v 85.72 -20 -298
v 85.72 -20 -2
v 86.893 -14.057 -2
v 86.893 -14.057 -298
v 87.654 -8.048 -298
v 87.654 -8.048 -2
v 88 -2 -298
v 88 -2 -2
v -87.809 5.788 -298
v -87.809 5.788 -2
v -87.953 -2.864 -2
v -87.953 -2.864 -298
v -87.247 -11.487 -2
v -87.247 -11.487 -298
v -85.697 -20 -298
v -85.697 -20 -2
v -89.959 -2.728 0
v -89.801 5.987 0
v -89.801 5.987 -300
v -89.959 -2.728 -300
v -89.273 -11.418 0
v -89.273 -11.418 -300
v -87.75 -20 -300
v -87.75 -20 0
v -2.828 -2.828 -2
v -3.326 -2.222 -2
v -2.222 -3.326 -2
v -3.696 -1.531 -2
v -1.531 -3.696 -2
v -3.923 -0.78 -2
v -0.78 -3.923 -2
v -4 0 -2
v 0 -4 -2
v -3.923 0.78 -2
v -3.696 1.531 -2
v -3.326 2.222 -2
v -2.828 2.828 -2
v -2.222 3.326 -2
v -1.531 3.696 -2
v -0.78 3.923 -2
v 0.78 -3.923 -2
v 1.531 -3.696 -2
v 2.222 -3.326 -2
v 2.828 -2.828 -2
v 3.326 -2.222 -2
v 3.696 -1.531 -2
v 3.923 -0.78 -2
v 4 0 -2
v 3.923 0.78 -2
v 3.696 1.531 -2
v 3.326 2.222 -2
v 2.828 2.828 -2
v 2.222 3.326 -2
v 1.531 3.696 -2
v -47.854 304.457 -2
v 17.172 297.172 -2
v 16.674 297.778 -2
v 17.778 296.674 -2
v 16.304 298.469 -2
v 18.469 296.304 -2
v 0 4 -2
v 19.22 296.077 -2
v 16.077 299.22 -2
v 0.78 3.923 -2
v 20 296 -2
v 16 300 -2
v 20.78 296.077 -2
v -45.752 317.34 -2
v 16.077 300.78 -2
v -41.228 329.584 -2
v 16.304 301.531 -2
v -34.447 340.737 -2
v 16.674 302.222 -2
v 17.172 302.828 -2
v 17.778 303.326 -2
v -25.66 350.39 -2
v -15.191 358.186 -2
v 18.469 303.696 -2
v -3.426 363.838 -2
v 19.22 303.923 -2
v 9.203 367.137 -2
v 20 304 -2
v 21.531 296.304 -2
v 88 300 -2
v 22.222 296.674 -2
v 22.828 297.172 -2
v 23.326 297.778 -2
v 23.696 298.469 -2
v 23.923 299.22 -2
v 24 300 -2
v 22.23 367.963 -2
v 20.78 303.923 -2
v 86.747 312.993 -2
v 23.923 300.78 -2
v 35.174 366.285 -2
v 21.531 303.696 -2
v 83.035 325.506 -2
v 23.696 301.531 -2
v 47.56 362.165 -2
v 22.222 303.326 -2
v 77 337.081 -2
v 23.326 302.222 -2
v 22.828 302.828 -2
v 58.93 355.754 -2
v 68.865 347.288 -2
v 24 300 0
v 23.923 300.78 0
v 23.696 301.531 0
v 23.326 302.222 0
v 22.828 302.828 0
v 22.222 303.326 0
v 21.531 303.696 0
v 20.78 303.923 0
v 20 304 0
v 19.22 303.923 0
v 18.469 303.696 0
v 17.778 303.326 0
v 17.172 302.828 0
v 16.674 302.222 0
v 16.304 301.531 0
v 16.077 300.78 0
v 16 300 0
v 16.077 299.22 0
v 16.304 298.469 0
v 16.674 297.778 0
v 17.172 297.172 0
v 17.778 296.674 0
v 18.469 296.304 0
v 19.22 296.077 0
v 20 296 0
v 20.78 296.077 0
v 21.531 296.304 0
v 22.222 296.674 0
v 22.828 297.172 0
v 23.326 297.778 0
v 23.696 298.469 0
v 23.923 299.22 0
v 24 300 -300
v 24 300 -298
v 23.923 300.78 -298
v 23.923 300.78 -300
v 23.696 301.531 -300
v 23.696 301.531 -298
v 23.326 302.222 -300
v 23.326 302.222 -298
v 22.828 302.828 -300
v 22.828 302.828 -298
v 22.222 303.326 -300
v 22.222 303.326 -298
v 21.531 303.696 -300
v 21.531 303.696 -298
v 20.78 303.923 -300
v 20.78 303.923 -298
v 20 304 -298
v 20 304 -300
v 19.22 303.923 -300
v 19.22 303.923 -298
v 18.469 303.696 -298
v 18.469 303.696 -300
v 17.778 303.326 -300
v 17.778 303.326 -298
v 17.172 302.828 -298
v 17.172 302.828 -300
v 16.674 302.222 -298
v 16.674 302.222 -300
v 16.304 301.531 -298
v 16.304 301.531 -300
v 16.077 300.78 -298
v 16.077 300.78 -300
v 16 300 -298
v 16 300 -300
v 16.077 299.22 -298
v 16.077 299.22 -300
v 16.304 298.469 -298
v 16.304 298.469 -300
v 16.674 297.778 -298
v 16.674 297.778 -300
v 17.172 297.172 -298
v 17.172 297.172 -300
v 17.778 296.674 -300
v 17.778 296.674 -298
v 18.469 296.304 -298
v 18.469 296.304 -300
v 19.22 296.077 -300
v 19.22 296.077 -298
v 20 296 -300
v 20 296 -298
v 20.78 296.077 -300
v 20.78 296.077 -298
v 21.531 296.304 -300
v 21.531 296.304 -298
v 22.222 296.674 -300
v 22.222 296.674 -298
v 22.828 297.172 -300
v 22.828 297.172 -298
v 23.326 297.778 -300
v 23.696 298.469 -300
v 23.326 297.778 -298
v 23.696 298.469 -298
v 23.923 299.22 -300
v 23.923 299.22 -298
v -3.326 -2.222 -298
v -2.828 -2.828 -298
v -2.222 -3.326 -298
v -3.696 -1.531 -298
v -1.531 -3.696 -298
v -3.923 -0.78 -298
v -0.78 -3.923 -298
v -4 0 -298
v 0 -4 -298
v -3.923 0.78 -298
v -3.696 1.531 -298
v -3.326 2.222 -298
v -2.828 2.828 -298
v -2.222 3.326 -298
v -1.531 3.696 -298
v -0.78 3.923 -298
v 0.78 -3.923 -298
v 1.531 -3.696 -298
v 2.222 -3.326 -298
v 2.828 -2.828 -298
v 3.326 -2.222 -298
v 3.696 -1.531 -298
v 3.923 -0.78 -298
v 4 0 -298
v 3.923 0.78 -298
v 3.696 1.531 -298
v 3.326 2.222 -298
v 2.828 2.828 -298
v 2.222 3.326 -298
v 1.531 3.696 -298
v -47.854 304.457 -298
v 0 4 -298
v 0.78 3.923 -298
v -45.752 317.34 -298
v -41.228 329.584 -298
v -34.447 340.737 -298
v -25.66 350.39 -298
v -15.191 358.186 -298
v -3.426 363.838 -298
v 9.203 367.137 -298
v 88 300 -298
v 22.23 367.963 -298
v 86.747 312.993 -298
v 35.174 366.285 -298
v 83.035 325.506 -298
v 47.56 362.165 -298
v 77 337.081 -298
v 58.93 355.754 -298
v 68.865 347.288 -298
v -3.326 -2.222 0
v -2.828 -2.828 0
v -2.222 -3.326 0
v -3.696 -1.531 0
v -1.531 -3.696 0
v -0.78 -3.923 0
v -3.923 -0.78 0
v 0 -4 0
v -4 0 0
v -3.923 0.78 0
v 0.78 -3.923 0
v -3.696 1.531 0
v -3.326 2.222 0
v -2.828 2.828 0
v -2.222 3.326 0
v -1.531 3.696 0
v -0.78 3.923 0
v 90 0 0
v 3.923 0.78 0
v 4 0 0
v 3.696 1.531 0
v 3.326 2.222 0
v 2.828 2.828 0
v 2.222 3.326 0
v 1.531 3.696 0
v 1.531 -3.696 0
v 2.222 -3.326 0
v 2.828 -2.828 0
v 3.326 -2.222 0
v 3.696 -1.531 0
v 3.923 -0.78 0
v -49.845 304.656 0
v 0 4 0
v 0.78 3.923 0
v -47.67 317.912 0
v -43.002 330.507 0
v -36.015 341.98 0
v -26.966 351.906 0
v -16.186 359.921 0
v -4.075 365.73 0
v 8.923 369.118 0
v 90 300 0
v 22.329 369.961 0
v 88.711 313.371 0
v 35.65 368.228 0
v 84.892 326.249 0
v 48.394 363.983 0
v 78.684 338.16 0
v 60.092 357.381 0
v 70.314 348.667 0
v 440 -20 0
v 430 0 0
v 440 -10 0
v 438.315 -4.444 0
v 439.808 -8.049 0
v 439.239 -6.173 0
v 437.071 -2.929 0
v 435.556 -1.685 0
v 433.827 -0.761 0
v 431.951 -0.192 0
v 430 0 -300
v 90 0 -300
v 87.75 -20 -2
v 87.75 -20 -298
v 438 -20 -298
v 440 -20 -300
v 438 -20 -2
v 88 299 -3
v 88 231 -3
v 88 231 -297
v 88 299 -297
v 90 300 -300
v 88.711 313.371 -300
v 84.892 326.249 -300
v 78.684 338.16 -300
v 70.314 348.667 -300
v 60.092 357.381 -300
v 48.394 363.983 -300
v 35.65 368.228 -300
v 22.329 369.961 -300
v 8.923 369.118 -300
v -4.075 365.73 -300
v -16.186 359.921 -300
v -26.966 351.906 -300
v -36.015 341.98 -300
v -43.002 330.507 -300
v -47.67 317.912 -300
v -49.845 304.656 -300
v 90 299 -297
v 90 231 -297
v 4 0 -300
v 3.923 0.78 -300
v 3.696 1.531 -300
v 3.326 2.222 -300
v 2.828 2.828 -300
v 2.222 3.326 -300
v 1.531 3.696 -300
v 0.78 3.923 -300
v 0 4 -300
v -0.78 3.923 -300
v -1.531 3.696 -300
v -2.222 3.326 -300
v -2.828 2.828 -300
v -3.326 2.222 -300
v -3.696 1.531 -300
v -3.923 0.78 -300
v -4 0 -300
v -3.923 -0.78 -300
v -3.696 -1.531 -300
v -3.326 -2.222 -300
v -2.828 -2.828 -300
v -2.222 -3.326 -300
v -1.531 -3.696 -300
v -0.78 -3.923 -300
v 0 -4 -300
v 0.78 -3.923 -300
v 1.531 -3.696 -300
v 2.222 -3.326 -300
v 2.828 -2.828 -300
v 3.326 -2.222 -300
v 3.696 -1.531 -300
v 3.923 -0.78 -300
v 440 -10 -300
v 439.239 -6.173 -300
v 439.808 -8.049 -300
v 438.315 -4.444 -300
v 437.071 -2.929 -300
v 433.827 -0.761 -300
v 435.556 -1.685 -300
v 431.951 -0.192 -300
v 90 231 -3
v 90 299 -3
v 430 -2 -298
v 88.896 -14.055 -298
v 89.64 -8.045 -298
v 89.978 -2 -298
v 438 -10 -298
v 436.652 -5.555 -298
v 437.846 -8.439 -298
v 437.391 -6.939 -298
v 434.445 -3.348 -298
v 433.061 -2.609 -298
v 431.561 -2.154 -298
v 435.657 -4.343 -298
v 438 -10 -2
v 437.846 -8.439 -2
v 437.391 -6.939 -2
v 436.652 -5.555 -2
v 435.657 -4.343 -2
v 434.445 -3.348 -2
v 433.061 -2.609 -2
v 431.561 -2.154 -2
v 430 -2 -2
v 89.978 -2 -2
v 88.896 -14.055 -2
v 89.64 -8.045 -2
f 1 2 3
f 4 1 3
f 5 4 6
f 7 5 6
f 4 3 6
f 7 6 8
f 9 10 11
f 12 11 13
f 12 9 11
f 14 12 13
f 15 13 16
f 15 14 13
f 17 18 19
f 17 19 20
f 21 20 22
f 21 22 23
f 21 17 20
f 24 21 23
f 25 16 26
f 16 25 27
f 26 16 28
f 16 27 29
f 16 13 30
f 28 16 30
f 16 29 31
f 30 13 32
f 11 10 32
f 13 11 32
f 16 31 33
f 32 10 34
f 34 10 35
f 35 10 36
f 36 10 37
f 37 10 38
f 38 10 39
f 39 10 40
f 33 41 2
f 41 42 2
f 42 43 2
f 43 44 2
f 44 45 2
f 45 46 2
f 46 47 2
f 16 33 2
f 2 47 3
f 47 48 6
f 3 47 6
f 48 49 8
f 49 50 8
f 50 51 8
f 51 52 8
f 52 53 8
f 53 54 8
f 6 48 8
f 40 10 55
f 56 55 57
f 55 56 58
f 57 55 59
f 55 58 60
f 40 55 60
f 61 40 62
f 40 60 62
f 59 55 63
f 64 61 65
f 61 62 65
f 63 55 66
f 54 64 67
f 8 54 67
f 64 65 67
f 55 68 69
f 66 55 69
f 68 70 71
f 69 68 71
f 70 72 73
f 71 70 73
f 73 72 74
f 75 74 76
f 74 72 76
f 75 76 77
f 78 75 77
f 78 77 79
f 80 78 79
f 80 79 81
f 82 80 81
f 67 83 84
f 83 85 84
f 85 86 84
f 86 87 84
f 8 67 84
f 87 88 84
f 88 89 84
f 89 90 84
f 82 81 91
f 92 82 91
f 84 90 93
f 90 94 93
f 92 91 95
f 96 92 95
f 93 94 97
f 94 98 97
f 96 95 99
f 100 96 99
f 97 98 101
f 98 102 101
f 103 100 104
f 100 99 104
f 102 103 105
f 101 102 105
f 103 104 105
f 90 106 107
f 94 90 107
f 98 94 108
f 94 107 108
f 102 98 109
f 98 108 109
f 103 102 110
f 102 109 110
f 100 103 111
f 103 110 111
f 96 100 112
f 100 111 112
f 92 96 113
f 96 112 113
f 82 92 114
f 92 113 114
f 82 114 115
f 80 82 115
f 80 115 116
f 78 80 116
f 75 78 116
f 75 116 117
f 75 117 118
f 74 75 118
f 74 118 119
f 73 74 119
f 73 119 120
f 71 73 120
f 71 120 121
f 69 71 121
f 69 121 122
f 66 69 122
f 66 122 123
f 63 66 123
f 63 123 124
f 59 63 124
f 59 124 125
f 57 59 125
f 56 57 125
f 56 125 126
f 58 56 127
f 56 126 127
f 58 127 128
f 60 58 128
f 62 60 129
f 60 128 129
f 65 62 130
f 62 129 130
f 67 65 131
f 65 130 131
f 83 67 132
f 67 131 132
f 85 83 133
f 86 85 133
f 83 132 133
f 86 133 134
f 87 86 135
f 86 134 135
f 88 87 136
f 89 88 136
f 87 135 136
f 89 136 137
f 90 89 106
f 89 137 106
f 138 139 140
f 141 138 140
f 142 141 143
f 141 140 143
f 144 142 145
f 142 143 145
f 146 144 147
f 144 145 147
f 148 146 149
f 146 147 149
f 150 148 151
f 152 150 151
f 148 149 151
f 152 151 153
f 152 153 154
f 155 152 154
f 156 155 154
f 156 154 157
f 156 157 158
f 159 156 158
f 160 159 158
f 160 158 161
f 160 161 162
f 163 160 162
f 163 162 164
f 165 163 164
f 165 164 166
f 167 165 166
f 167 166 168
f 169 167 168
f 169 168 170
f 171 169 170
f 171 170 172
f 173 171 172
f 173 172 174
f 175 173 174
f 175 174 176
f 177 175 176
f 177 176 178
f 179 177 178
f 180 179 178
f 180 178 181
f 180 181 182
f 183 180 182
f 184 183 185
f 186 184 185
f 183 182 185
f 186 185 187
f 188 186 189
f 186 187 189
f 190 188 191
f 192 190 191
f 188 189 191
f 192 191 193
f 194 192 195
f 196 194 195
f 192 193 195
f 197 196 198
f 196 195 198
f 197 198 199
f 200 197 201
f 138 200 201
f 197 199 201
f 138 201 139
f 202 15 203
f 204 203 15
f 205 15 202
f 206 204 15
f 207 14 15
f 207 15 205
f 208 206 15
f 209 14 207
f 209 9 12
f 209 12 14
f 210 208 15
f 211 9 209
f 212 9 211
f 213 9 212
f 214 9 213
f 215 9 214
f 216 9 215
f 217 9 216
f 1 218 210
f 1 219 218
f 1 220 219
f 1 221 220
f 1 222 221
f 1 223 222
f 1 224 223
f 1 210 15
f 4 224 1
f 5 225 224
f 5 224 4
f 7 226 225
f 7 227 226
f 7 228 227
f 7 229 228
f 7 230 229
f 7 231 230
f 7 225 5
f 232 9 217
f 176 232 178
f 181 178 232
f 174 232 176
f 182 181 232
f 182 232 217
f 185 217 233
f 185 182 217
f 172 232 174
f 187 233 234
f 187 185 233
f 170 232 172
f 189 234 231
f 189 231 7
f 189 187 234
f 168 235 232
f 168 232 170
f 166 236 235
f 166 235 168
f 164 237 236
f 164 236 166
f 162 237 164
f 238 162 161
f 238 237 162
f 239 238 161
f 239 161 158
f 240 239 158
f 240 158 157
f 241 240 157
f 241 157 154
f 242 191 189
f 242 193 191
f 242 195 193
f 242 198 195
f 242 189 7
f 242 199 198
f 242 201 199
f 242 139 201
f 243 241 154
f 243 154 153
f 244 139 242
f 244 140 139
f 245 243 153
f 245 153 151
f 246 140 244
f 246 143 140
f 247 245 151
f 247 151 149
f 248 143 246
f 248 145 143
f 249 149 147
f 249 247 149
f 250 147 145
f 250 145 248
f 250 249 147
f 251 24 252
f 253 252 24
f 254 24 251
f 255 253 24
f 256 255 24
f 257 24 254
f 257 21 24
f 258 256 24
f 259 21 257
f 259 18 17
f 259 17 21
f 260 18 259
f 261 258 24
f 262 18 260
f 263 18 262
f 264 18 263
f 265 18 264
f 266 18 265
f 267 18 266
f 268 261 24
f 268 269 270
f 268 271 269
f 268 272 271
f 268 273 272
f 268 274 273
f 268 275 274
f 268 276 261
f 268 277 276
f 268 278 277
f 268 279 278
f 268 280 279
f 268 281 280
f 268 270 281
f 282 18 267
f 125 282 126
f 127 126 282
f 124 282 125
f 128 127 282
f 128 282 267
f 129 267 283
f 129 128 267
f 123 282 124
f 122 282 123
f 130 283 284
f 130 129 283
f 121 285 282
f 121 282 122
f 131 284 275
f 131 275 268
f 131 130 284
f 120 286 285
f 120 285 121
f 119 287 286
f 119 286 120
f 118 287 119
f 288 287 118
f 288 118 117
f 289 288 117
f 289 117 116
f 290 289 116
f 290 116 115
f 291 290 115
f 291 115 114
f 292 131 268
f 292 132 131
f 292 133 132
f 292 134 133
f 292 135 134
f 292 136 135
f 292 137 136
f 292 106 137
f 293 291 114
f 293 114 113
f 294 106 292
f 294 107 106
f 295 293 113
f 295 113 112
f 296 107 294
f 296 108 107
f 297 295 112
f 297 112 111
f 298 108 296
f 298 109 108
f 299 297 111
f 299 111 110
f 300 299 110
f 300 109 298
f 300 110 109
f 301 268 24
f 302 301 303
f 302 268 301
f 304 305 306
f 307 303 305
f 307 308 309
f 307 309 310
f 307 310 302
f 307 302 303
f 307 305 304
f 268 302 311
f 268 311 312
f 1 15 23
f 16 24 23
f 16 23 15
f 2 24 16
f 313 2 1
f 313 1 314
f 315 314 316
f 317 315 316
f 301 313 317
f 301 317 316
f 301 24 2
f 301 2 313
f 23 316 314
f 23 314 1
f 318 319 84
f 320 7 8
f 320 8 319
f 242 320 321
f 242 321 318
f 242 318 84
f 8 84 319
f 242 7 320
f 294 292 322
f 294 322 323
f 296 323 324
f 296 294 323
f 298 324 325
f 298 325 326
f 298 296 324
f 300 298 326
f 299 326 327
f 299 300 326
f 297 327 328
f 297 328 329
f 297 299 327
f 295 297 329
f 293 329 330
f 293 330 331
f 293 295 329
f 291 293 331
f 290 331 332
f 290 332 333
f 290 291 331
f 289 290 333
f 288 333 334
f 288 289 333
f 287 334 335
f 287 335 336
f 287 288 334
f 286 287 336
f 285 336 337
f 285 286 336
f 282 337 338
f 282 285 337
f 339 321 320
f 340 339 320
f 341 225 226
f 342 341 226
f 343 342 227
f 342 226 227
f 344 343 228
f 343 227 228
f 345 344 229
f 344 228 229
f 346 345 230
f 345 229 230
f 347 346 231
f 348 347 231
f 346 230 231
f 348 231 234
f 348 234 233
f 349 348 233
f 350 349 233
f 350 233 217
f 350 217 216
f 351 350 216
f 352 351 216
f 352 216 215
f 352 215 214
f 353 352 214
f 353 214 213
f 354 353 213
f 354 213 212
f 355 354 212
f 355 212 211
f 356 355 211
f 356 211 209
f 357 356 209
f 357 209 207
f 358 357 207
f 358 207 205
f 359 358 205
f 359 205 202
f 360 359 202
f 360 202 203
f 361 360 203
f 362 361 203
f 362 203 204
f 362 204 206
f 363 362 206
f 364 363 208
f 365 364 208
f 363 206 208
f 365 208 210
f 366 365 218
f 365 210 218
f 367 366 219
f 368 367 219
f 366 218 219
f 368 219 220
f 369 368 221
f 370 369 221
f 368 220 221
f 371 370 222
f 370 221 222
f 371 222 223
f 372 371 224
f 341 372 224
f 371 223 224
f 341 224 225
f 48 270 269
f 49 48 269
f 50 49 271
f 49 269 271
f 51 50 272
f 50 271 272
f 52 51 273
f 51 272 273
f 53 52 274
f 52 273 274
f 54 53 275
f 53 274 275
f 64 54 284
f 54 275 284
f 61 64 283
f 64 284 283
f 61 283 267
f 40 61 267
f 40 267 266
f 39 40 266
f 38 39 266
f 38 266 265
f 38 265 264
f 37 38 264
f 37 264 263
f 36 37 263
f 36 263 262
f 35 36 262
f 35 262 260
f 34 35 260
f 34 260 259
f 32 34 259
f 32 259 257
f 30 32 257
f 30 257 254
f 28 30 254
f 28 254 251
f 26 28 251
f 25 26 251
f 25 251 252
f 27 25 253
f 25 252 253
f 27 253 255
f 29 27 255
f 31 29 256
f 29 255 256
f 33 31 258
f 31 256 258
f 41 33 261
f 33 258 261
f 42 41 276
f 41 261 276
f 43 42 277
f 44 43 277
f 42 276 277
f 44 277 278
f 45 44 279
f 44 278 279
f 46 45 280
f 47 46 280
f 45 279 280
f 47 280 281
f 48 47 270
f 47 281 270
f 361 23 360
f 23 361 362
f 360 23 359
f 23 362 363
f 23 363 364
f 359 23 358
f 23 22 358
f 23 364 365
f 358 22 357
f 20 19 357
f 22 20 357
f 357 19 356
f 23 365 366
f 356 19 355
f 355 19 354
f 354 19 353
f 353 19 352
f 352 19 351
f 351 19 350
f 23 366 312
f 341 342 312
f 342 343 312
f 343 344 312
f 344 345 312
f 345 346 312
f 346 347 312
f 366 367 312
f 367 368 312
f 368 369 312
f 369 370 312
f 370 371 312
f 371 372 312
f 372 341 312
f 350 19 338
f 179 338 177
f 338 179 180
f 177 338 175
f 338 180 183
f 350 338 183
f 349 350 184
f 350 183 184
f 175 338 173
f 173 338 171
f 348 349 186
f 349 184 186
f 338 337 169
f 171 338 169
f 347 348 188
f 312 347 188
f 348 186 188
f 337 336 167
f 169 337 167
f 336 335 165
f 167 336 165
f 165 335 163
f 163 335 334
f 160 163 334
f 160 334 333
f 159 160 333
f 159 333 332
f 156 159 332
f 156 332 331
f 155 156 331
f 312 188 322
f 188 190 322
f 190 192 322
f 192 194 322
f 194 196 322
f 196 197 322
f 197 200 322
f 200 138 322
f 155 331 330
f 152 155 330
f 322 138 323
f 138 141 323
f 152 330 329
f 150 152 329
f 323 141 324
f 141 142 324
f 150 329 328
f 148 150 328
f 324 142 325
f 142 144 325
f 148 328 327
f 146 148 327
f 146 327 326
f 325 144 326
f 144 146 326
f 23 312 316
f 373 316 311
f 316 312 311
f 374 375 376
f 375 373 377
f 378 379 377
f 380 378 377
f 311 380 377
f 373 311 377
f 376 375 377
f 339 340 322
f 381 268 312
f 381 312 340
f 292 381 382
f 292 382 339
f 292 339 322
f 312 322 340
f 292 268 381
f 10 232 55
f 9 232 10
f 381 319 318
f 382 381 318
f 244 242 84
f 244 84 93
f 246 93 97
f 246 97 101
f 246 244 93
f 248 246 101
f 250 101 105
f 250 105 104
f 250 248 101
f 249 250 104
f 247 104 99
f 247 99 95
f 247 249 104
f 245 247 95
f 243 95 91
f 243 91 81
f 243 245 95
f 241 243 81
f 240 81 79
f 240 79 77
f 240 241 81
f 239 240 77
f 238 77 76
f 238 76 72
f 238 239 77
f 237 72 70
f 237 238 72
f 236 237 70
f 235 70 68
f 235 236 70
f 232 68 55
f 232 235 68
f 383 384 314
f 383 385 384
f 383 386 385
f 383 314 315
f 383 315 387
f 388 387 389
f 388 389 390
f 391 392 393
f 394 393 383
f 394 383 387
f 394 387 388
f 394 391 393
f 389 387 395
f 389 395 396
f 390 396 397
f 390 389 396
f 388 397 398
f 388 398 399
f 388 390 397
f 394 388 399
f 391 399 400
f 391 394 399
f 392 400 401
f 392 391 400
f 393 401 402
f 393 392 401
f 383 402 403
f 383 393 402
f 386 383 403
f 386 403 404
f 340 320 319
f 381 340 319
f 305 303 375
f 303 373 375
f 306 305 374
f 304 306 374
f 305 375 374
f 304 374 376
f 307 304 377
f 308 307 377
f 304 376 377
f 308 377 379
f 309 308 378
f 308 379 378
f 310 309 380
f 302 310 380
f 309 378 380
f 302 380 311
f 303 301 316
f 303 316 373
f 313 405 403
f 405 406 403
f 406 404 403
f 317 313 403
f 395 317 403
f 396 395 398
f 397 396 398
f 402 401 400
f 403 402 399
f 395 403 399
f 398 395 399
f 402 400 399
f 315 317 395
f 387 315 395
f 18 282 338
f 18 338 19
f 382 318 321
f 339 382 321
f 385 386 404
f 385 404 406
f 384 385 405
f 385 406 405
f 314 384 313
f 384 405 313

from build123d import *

# Parameters (mm, degrees)
EXTRUDE_1_DEPTH      = 300
FILLET_1_R           = 10
SHELL_START          = -298
SHELL_1_DEPTH        = 296
SKETCH_2_R           = 4
CUT_EXTRUDE_1_DEPTH  = 649.459713475
EXTRUDE_2_DEPTH      = 300
CUT_EXTRUDE_12_DEPTH = 10


# Read off the part's stored shape, not the designer's step: 抽壳1
with BuildPart() as part:
    # 草图1 → 凸台-拉伸1 (new body)
    with BuildSketch(Plane.XY):
        with BuildLine():
            Line((440, -20), (440, 0))
            Line((440, 0), (90, 0))
            Line((90, 0), (90, 300))
            ThreePointArc((90, 300), (22.32945557, 369.961229526), (-49.84496105, 304.656330737))
            Line((-49.84496105, 304.656330737), (-89.800664207, 5.986710947))
            ThreePointArc((-89.800664207, 5.986710947), (-89.720985624, -7.081294982), (-87.749643874, -20))
            Line((-87.749643874, -20), (0, -20))
            Line((0, -20), (400, -20))
            Line((400, -20), (440, -20))
        make_face()
    extrude(amount=-EXTRUDE_1_DEPTH)

    # 圆角1
    fillet_1_edges = [part.edges().sort_by_distance(p)[0] for p in [
        (440, 0, -150),
    ]]
    fillet(fillet_1_edges, radius=FILLET_1_R)

    # 抽壳1 outline → 抽壳1 (cut)
    with BuildSketch(Plane.XY.offset(SHELL_START)):
        with BuildLine():
            Line((88, -2), (88, 300))
            ThreePointArc((88, 300), (22.229935395, 367.963426842), (-47.85374671, 304.45747209))
            Line((-47.85374671, 304.45747209), (-87.809464232, 5.787744921))
            ThreePointArc((-87.809464232, 5.787744921), (-87.706256756, -7.184185814), (-85.697141143, -20))
            Line((-85.697141143, -20), (438, -20))
            Line((438, -20), (438, -10))
            ThreePointArc((438, -10), (435.656854249, -4.343145751), (430, -2))
            Line((430, -2), (88, -2))
        make_face()
    extrude(amount=SHELL_1_DEPTH, mode=Mode.SUBTRACT)

    # 草图2 → 切除-拉伸1 (cut, through all)
    with BuildSketch(Plane.XY):
        Circle(SKETCH_2_R)
        with Locations((20, 300)):
            Circle(SKETCH_2_R)
    extrude(amount=-CUT_EXTRUDE_1_DEPTH, mode=Mode.SUBTRACT)

    # 草图3 → 凸台-拉伸2 (add)
    with BuildSketch(Plane.XY):
        with BuildLine():
            Line((88.022724339, 0), (90, 0))
            ThreePointArc((90, 0), (89.435641521, -10.063102189), (87.749643874, -20))
            Line((87.749643874, -20), (85.720475967, -20))
            ThreePointArc((85.720475967, -20), (87.4452681, -10.066036305), (88.022724339, 0))
        make_face()
    extrude(amount=-EXTRUDE_2_DEPTH)

    # 草图4 → 切除-拉伸12 (cut)
    with BuildSketch(Plane.ZY.offset(-88)):
        Polygon((-7, 231), (-3, 231), (-3, 299), (-7, 299), (-293, 299), (-297, 299), (-297, 231), align=None)
    extrude(amount=-CUT_EXTRUDE_12_DEPTH, mode=Mode.SUBTRACT)


solid = part.part
